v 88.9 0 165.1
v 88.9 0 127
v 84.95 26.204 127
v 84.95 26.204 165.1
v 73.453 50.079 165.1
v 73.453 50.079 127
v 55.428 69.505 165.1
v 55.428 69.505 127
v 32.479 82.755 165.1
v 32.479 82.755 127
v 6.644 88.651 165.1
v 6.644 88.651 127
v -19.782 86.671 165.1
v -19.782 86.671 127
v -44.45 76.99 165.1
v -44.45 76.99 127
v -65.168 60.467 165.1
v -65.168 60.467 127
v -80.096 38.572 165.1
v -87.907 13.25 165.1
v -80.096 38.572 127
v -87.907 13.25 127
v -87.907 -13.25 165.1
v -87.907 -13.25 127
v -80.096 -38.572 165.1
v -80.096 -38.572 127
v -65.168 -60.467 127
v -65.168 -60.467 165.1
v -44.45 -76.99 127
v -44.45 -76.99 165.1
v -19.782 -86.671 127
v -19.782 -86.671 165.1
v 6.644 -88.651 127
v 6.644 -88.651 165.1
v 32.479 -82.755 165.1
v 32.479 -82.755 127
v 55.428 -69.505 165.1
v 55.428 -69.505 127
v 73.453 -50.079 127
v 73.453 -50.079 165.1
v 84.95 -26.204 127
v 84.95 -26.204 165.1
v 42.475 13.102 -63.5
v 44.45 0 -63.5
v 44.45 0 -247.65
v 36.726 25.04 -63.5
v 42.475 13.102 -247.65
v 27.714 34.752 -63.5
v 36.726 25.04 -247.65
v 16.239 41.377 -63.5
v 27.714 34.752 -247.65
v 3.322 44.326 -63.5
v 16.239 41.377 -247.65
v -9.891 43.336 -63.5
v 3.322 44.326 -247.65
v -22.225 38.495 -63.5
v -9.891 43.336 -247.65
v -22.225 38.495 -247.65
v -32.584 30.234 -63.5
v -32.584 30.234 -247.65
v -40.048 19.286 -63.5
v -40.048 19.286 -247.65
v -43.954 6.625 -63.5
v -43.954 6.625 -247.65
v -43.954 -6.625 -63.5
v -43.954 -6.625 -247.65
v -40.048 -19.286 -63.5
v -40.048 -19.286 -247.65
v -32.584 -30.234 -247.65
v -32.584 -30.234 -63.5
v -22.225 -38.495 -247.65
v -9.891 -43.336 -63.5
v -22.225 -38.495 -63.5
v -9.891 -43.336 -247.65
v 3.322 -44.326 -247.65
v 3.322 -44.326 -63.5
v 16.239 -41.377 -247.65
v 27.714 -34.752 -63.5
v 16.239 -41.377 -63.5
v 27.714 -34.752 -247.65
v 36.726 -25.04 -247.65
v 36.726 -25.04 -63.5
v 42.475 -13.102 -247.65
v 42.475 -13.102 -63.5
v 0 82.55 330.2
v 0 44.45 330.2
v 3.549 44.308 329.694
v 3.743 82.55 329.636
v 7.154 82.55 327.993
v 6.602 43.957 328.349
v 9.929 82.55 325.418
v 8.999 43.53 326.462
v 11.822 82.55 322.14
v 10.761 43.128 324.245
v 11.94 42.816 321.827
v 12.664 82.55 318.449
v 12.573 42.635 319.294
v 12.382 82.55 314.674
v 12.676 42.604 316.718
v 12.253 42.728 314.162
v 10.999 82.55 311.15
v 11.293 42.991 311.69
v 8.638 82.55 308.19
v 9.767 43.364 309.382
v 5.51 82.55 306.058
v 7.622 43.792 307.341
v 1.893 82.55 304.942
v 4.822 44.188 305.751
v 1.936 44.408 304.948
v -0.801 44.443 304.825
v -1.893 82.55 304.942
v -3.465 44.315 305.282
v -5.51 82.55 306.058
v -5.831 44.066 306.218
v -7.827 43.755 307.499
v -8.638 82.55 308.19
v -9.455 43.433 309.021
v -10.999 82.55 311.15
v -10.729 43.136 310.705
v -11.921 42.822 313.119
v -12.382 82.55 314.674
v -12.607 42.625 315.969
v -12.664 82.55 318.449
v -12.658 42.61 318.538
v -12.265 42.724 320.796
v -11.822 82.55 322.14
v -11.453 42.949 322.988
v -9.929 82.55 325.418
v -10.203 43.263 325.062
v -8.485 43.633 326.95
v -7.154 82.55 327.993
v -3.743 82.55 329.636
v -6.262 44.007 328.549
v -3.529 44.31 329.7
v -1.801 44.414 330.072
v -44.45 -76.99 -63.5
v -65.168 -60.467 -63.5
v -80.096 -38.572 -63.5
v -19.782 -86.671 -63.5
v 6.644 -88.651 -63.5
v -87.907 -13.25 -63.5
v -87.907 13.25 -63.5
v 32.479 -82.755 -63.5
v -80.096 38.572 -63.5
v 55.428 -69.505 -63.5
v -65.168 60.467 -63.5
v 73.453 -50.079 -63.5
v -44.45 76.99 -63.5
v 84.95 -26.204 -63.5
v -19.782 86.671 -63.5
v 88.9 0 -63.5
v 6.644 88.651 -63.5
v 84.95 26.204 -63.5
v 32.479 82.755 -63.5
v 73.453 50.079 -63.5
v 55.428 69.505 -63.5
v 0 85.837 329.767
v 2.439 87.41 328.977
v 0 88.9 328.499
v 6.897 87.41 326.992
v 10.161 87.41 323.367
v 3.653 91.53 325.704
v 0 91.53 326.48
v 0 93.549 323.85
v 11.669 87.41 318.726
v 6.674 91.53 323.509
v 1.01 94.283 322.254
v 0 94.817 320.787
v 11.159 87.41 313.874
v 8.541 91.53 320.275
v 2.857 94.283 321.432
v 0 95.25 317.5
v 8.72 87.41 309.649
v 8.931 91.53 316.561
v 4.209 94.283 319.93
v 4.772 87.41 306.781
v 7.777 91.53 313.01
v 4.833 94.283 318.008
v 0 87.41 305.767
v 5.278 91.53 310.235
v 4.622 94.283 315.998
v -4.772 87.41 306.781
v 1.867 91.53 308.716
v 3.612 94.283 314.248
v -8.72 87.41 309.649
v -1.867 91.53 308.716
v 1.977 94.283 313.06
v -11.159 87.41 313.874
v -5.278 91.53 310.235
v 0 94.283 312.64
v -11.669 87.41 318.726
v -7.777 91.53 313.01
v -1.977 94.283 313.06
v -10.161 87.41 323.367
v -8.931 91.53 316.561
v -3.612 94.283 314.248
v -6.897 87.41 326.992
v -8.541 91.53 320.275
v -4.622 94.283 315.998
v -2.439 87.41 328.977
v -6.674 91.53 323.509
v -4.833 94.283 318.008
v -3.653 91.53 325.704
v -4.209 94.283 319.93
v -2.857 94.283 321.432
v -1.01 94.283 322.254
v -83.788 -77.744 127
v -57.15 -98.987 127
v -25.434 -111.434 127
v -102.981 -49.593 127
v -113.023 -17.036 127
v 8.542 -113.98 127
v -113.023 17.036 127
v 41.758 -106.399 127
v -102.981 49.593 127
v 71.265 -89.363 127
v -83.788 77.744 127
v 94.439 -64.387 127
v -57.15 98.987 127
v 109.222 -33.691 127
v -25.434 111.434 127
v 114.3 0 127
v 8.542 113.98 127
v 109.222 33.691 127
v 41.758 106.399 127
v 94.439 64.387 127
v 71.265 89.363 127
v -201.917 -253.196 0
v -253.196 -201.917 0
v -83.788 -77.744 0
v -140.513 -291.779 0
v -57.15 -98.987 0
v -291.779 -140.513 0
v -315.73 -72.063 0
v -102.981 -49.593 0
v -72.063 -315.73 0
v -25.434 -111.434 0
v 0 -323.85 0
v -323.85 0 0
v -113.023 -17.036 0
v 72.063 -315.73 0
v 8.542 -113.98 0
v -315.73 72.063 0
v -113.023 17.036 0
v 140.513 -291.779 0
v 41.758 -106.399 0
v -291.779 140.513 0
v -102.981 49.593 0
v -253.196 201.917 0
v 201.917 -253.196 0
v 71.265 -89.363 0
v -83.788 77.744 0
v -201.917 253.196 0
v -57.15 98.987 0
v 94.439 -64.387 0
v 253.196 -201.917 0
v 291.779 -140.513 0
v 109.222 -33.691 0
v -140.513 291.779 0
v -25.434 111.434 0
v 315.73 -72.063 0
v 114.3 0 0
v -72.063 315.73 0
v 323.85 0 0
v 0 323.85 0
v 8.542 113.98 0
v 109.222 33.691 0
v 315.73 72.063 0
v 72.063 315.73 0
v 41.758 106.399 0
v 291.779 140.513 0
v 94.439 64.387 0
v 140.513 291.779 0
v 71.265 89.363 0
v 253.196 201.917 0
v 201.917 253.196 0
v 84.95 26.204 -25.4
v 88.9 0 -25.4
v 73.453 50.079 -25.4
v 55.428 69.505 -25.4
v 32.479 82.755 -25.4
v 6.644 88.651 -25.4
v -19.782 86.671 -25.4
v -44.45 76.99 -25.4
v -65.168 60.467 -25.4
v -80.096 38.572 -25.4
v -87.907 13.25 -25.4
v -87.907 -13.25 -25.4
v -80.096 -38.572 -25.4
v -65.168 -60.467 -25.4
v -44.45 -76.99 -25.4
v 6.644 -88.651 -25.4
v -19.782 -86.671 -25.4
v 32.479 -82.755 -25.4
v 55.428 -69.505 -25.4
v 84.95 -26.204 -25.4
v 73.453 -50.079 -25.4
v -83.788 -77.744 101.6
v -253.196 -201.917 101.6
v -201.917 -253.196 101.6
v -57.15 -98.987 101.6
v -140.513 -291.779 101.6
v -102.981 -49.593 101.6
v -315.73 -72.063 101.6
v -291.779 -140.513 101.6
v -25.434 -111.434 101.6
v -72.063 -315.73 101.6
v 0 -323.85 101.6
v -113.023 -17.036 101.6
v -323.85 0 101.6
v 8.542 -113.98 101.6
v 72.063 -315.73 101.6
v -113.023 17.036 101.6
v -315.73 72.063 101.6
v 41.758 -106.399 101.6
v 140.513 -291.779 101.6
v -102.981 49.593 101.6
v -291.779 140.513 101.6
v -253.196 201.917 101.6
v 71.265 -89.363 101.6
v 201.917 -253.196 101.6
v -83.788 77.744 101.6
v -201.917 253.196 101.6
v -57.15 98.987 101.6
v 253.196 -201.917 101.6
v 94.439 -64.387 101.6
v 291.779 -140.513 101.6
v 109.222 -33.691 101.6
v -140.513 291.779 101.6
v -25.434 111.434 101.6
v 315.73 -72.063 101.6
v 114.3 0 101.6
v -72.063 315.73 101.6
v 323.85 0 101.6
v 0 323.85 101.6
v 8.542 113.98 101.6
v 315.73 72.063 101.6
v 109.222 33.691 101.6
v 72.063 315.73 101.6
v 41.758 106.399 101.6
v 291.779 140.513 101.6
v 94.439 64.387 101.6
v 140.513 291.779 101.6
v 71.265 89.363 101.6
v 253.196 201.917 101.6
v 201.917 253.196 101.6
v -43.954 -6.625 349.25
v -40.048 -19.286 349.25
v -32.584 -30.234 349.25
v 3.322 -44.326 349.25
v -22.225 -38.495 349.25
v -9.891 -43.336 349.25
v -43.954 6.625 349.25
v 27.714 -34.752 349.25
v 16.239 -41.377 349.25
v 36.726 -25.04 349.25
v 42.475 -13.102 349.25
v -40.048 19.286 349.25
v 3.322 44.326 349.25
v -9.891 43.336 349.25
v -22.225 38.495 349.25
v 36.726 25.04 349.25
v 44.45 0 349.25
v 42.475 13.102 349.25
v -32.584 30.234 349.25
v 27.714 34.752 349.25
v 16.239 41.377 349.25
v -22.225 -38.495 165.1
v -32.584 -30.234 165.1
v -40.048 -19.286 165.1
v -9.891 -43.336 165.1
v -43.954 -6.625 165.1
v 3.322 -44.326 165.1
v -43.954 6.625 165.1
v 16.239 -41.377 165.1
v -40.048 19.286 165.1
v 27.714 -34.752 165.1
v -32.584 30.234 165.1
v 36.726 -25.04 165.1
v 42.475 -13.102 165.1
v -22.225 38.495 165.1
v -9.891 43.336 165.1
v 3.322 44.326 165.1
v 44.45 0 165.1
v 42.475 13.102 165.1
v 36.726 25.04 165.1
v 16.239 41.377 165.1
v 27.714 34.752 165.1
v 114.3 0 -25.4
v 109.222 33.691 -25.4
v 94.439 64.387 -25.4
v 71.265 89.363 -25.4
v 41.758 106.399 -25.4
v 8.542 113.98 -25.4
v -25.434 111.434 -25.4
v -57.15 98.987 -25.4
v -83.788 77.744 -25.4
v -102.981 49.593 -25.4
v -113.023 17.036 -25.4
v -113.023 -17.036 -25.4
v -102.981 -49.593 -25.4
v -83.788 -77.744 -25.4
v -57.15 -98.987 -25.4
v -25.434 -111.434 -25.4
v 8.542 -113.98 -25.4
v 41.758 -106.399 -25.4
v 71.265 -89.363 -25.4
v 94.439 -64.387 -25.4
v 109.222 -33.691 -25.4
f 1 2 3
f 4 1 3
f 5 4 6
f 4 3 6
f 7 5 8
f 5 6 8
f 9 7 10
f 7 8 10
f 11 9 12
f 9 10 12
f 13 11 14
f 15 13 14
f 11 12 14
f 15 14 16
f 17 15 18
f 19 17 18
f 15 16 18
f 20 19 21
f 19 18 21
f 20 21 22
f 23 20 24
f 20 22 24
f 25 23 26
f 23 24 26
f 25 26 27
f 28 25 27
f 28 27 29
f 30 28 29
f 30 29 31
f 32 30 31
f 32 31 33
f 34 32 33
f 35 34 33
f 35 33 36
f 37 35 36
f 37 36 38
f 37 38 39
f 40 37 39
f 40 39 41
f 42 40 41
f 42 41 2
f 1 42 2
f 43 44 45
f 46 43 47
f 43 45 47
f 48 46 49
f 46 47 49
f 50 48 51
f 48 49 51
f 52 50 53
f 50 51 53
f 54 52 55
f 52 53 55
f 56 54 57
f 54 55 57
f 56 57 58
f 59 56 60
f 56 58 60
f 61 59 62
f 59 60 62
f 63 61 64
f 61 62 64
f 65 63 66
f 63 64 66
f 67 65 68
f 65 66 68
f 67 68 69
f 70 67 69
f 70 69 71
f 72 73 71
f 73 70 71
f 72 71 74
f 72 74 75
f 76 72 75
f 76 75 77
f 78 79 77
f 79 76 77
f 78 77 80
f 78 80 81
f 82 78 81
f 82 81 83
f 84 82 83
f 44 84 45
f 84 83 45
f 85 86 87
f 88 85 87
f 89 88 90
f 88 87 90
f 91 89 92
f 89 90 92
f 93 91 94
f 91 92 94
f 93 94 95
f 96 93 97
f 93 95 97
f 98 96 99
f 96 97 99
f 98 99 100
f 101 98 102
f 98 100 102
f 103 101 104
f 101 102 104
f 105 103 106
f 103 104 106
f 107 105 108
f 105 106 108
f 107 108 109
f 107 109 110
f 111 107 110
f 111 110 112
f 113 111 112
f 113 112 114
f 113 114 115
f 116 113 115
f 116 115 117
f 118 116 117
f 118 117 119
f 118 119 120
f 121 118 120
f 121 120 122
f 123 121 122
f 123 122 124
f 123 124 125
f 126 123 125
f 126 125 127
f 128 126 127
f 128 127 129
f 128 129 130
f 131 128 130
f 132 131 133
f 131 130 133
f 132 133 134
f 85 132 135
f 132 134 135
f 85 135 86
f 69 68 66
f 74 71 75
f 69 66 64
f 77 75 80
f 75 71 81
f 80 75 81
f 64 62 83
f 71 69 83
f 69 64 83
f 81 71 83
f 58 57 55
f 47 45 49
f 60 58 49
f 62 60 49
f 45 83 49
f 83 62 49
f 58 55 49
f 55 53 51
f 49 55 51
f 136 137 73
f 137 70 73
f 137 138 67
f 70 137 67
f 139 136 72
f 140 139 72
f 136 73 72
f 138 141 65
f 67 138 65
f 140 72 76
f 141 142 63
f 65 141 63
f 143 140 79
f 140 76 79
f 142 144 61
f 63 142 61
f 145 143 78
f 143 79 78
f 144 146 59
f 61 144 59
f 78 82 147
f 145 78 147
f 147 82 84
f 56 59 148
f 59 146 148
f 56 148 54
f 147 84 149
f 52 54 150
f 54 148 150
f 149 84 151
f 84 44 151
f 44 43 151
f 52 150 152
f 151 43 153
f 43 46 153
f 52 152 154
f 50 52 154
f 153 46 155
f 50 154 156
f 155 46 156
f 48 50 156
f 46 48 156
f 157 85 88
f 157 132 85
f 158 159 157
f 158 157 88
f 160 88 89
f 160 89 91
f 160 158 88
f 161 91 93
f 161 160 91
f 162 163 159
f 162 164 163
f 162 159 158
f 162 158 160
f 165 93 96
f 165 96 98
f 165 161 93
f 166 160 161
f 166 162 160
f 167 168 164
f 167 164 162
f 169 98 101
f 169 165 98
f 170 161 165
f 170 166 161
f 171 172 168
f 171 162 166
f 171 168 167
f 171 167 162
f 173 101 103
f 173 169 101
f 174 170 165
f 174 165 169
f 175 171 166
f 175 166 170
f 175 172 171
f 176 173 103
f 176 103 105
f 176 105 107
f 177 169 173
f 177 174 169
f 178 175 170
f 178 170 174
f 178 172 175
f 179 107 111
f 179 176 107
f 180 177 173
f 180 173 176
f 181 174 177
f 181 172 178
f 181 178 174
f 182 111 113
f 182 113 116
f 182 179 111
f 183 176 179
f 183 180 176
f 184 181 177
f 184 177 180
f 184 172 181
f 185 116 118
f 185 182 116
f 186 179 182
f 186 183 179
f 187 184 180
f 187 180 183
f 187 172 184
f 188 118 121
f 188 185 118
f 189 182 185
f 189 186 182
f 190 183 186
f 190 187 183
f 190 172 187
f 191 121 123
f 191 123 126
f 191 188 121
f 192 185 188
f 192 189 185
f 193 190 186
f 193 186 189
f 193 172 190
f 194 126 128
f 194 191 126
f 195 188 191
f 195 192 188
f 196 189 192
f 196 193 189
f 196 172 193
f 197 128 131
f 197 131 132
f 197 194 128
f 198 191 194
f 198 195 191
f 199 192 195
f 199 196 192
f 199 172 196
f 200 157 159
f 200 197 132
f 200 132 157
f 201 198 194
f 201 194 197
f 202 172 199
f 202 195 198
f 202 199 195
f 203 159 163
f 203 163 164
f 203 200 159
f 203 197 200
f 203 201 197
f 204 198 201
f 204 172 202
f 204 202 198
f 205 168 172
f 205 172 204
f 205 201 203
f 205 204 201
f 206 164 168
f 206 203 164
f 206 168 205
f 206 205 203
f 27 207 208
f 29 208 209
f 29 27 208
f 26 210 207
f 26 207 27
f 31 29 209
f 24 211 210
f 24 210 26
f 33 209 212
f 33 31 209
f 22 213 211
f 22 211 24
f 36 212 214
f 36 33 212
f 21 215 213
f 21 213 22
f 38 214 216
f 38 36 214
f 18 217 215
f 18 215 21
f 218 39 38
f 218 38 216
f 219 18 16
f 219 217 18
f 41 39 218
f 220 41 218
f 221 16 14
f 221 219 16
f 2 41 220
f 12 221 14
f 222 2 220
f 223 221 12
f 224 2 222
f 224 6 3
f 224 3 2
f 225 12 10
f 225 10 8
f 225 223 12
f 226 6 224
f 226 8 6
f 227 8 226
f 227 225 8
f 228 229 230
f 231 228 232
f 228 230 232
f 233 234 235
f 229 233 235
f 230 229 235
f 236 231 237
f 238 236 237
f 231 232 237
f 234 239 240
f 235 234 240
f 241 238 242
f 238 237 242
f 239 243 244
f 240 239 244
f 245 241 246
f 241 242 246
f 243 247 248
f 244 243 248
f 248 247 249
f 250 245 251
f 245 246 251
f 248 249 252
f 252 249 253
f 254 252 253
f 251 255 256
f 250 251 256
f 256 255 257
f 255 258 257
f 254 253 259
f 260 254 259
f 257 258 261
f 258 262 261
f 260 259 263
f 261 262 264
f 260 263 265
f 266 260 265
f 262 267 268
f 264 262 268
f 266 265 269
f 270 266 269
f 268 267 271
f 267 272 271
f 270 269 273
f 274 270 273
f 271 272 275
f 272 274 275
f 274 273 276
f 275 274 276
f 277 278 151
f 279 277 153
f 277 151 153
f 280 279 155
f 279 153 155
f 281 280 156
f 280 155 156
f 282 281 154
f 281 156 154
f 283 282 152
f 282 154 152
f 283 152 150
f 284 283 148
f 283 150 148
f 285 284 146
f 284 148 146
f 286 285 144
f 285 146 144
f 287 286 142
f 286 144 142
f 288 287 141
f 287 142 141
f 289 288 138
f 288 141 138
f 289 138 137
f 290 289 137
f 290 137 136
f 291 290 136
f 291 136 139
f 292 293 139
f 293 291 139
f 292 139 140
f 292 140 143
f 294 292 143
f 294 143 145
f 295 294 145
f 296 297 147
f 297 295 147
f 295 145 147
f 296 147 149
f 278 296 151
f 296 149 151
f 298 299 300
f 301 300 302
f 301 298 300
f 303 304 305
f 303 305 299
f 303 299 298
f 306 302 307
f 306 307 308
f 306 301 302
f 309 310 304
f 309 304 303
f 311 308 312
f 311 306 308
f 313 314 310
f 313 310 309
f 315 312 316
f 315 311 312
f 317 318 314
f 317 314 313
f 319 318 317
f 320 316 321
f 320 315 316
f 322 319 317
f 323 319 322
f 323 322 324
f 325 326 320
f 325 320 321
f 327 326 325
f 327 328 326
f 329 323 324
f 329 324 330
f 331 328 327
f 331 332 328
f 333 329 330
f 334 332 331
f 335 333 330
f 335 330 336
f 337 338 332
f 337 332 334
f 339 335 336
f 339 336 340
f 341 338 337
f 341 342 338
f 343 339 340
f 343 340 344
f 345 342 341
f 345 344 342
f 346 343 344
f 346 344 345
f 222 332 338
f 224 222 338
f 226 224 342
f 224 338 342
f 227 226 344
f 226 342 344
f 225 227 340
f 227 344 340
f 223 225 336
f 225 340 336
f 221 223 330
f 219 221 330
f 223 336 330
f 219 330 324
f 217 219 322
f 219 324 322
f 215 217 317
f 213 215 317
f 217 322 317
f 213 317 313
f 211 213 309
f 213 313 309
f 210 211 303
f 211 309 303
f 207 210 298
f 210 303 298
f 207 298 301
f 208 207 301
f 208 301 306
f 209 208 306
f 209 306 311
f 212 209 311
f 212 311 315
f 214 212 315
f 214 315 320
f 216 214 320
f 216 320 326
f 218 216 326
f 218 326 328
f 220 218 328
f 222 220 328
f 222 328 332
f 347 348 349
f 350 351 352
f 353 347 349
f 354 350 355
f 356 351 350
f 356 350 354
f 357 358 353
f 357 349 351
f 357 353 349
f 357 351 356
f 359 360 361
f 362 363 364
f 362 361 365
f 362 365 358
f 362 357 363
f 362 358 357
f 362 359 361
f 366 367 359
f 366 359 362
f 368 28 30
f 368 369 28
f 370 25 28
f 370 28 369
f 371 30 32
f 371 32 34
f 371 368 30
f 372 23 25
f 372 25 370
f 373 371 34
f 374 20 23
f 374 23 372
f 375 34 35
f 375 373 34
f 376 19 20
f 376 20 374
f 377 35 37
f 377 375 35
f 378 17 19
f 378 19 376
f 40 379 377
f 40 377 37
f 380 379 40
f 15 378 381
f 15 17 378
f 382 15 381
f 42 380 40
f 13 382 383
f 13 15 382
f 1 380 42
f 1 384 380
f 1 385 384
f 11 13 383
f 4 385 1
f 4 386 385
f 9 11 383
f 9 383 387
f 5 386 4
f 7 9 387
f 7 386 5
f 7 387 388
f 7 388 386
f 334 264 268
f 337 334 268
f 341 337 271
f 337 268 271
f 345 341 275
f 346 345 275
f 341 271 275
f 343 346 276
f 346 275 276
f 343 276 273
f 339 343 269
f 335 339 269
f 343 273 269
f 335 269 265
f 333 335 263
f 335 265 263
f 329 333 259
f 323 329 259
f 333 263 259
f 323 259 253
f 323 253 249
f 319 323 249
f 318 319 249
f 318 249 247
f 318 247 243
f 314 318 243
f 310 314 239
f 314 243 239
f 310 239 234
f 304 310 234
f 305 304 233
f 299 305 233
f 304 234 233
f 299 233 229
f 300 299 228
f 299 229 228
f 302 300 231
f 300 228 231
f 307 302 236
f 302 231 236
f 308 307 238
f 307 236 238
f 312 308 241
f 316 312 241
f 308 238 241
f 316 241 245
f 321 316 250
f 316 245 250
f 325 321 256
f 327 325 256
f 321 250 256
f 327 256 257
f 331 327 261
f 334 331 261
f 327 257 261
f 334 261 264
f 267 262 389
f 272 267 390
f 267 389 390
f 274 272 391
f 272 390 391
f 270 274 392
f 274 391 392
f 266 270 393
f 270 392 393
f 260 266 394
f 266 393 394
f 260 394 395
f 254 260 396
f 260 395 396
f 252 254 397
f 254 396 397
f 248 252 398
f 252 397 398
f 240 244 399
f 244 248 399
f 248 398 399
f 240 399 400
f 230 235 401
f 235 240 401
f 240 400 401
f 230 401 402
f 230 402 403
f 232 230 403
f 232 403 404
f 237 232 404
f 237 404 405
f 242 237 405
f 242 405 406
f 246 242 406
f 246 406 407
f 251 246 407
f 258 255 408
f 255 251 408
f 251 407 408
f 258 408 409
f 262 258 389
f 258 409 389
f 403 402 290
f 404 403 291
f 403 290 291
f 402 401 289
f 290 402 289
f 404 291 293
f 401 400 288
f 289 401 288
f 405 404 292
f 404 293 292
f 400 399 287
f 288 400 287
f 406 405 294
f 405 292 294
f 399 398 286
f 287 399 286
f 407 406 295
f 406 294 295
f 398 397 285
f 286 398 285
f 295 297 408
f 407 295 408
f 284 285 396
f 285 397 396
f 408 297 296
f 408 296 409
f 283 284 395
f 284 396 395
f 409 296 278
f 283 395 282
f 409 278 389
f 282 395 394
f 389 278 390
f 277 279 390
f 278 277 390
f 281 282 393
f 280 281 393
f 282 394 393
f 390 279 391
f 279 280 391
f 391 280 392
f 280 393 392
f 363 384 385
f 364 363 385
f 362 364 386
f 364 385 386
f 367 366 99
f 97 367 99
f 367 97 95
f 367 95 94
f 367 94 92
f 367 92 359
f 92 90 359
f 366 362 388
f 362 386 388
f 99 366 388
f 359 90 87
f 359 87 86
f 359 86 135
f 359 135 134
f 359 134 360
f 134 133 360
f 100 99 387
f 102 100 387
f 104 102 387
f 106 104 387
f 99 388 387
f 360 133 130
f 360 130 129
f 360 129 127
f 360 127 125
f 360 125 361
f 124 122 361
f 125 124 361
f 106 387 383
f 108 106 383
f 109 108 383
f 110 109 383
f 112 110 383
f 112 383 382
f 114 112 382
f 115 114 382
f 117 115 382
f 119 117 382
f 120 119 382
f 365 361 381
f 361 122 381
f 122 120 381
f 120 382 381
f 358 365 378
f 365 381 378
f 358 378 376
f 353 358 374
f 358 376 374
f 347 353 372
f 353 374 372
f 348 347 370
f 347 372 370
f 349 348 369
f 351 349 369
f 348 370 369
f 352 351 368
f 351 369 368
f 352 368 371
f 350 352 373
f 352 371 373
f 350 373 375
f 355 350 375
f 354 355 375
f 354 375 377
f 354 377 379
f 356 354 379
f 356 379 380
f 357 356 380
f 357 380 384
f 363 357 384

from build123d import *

# Parameters (mm, degrees)
SKETCH1_R                = 323.85
BOSS_EXTRUDE3_DEPTH      = 101.6
BOSS_EXTRUDE4_DEPTH      = 25.4
BOSS_EXTRUDE4_DEPTH_BACK = 127
SKETCH2_R                = 114.3
BOSS_EXTRUDE5_DEPTH      = 38.1
BOSS_EXTRUDE5_DEPTH_BACK = 190.5
SKETCH4_R                = 88.9
BOSS_EXTRUDE6_DEPTH      = 184.15
BOSS_EXTRUDE6_DEPTH_BACK = 412.75
SKETCH5_R                = 44.45
BOSS_EXTRUDE7_DEPTH      = 50.8
BOSS_EXTRUDE7_DEPTH_BACK = 25.4
SKETCH6_R                = 12.7
FILLET2_R                = 12.7


with BuildPart() as part:
    # Sketch1 → Boss-Extrude3 (new body)
    with BuildSketch(Plane.XY):
        Circle(SKETCH1_R)
    extrude(amount=BOSS_EXTRUDE3_DEPTH)

    # Sketch2 → Boss-Extrude4 (add, two sides: drawn at the far end of the back side and taken through both)
    with BuildSketch(Plane.XY.offset(101.6).offset(-BOSS_EXTRUDE4_DEPTH_BACK)):
        Circle(SKETCH2_R)
    extrude(amount=BOSS_EXTRUDE4_DEPTH + BOSS_EXTRUDE4_DEPTH_BACK)

    # Sketch4 → Boss-Extrude5 (add, two sides: drawn at the far end of the back side and taken through both)
    with BuildSketch(Plane.XY.offset(127).offset(-BOSS_EXTRUDE5_DEPTH_BACK)):
        Circle(SKETCH4_R)
    extrude(amount=BOSS_EXTRUDE5_DEPTH + BOSS_EXTRUDE5_DEPTH_BACK)

    # Sketch5 → Boss-Extrude6 (add, two sides: drawn at the far end of the back side and taken through both)
    with BuildSketch(Plane.XY.offset(165.1).offset(-BOSS_EXTRUDE6_DEPTH_BACK)):
        Circle(SKETCH5_R)
    extrude(amount=BOSS_EXTRUDE6_DEPTH + BOSS_EXTRUDE6_DEPTH_BACK)

    # Sketch6 → Boss-Extrude7 (add, two sides: drawn at the far end of the back side and taken through both)
    with BuildSketch(Plane(origin=(0, 44.45, 0), x_dir=(1, 0, 0), z_dir=(0, 1, 0)).offset(-BOSS_EXTRUDE7_DEPTH_BACK)):
        with Locations(Location((0, -317.5, 0), (0, 0, 270))):
            Circle(SKETCH6_R)
    extrude(amount=BOSS_EXTRUDE7_DEPTH + BOSS_EXTRUDE7_DEPTH_BACK)

    # Fillet2
    fillet2_edges = [part.edges().sort_by_distance(p)[0] for p in [
        (0, 95.25, 304.8),
    ]]
    fillet(fillet2_edges, radius=FILLET2_R)


solid = part.part
